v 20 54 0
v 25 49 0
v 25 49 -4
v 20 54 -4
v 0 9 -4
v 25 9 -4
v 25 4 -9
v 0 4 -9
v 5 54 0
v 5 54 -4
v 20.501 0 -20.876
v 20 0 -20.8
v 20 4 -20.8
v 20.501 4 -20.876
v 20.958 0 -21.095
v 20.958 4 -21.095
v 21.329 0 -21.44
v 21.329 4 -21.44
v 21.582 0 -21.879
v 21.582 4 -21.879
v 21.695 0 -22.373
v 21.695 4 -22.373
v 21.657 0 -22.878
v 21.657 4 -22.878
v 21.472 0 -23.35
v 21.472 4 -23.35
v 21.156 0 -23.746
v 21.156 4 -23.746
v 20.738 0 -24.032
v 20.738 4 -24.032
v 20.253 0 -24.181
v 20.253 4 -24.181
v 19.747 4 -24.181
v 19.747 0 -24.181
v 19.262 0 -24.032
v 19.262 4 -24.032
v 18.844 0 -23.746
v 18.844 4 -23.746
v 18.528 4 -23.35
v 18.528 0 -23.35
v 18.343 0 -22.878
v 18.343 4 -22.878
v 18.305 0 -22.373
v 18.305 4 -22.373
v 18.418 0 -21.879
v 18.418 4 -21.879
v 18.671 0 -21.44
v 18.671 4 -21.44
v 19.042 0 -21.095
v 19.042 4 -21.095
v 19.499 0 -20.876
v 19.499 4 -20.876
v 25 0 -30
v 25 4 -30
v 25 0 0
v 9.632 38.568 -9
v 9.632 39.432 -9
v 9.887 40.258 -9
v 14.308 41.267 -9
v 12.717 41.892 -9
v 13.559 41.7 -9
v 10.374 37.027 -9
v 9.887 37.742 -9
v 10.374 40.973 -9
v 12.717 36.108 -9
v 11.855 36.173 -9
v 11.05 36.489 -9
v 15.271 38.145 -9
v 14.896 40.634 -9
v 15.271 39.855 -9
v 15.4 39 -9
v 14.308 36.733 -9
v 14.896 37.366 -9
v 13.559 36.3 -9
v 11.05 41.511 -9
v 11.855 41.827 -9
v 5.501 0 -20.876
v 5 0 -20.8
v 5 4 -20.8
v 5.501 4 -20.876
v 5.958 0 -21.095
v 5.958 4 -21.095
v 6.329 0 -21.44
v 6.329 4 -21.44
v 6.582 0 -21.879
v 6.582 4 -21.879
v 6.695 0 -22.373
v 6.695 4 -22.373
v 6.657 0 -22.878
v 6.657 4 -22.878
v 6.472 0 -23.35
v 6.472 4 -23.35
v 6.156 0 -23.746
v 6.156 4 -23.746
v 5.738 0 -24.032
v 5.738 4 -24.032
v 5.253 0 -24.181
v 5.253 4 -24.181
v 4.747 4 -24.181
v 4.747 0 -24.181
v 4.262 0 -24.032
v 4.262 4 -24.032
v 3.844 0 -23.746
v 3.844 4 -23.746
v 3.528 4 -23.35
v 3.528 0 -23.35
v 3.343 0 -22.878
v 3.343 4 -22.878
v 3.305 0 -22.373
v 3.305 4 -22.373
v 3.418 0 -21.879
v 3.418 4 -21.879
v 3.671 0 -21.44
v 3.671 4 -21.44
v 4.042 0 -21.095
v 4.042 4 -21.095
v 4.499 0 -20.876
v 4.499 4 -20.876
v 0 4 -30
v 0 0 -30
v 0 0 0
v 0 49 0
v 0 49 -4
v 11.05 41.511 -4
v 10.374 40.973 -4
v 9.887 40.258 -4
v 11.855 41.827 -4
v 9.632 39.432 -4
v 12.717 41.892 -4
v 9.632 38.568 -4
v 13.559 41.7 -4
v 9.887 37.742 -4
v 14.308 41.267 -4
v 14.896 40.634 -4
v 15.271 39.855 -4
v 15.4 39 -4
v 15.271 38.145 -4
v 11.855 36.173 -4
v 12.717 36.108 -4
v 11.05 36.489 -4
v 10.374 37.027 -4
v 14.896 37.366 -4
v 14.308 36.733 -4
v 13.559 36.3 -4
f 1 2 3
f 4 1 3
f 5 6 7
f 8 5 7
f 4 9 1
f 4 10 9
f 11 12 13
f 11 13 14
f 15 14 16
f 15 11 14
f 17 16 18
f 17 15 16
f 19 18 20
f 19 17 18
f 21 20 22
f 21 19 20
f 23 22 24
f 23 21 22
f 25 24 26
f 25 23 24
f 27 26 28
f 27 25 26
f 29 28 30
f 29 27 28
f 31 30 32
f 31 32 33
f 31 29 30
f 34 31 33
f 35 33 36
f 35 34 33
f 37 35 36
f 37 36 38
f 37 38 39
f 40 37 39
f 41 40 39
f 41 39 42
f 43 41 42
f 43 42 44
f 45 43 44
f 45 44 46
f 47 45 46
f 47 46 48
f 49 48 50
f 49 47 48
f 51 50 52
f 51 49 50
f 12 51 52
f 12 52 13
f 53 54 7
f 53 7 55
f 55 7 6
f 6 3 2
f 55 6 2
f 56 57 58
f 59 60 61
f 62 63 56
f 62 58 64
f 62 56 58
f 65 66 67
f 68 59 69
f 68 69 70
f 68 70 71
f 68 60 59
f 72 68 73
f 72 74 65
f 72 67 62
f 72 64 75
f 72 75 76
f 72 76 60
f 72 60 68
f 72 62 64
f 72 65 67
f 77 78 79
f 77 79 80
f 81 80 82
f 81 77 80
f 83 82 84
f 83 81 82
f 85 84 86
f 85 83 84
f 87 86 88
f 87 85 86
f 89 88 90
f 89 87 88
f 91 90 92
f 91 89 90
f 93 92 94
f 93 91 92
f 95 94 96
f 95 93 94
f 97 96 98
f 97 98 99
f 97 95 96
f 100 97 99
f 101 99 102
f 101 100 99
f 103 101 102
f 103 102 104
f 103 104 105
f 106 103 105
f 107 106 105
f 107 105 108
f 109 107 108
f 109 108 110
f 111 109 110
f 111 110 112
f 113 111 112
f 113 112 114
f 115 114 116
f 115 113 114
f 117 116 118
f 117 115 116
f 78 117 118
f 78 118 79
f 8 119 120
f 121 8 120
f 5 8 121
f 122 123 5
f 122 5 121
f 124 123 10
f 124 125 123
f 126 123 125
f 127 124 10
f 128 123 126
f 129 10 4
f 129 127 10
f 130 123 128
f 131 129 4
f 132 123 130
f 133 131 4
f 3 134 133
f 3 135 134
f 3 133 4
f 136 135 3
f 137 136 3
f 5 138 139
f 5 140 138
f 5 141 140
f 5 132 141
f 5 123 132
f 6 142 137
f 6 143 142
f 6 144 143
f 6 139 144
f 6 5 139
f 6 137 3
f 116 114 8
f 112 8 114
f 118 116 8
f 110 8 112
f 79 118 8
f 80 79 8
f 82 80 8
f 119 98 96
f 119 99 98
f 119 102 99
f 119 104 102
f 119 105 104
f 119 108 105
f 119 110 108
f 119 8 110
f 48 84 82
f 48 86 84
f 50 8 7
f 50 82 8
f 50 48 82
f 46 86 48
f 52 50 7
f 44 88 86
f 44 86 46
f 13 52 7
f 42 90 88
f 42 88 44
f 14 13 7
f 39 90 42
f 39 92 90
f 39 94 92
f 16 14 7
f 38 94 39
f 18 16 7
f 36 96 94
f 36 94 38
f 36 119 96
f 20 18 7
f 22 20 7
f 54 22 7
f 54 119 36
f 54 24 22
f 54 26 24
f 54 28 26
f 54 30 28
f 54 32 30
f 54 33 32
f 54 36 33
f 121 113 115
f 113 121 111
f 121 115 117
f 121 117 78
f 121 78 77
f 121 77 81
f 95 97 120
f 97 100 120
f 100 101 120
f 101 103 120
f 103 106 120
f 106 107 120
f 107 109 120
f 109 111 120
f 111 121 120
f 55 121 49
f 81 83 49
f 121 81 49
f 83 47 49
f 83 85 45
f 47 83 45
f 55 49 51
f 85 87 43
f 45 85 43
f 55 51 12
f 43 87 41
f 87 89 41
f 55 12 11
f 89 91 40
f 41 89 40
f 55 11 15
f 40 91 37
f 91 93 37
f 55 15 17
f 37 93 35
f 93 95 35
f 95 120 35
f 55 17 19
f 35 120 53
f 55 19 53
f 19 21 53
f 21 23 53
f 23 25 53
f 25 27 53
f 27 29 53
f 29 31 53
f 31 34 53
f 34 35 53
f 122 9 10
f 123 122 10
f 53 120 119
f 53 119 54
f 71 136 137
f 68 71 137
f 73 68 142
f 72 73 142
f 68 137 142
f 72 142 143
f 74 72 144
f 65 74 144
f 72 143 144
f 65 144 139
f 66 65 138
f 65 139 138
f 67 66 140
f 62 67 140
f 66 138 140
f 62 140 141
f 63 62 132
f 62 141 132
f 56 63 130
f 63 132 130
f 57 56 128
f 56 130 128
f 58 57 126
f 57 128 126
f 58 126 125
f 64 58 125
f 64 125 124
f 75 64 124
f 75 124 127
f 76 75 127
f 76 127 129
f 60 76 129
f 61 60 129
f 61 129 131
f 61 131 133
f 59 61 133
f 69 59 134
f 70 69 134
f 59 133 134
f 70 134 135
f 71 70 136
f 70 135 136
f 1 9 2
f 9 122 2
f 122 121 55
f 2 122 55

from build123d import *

# Parameters (mm, degrees)
SKETCH_1_W      = 25
SKETCH_1_H      = 30
SKETCH_1_R      = 1.7
EXTRUDE_1_DEPTH = 4
SKETCH_2_W      = 25
SKETCH_2_H      = 4
EXTRUDE_2_DEPTH = 50
EXTRUDE_3_DEPTH = 25
SKETCH_4_R      = 2.9
EXTRUDE_4_DEPTH = 5
CHAMFER_2_SIZE  = 5


with BuildPart() as part:
    # 草图1 → 凸台-拉伸1 (new body)
    with BuildSketch(Plane(origin=(0, 0, 0), x_dir=(1, 0, 0), z_dir=(0, 1, 0))):
        with Locations((12.5, 15)):
            Rectangle(SKETCH_1_W, SKETCH_1_H)
        with Locations(Location((5, 22.5, 0), (0, 0, 270))):
            Circle(SKETCH_1_R, mode=Mode.SUBTRACT)
        with Locations(Location((20, 22.5, 0), (0, 0, 270))):
            Circle(SKETCH_1_R, mode=Mode.SUBTRACT)
    extrude(amount=EXTRUDE_1_DEPTH)

    # 草图2 → 凸台-拉伸2 (add)
    with BuildSketch(Plane(origin=(0, 4, 0), x_dir=(1, 0, 0), z_dir=(0, 1, 0))):
        with Locations((12.5, 2)):
            Rectangle(SKETCH_2_W, SKETCH_2_H)
    extrude(amount=EXTRUDE_2_DEPTH)

    # 草图3 → 凸台-拉伸3 (add)
    with BuildSketch(Plane(origin=(25, 0, 0), x_dir=(0, 0, -1), z_dir=(1, 0, 0))):
        Polygon((4, 4), (4, 9), (9, 4), align=None)
    extrude(amount=-EXTRUDE_3_DEPTH)

    # 草图4 → 凸台-拉伸4 (add)
    with BuildSketch(Plane(origin=(0, 0, -4), x_dir=(-1, 0, 0), z_dir=(0, 0, -1))):
        with Locations(Location((-12.5, 39, 0), (0, 0, 180))):
            Circle(SKETCH_4_R)
    extrude(amount=EXTRUDE_4_DEPTH)

    # 倒角2
    chamfer_2_edges = [part.edges().sort_by_distance(p)[0] for p in [
        (0, 54, -2),
        (25, 54, -2),
    ]]
    chamfer(chamfer_2_edges, length=CHAMFER_2_SIZE)


solid = part.part
